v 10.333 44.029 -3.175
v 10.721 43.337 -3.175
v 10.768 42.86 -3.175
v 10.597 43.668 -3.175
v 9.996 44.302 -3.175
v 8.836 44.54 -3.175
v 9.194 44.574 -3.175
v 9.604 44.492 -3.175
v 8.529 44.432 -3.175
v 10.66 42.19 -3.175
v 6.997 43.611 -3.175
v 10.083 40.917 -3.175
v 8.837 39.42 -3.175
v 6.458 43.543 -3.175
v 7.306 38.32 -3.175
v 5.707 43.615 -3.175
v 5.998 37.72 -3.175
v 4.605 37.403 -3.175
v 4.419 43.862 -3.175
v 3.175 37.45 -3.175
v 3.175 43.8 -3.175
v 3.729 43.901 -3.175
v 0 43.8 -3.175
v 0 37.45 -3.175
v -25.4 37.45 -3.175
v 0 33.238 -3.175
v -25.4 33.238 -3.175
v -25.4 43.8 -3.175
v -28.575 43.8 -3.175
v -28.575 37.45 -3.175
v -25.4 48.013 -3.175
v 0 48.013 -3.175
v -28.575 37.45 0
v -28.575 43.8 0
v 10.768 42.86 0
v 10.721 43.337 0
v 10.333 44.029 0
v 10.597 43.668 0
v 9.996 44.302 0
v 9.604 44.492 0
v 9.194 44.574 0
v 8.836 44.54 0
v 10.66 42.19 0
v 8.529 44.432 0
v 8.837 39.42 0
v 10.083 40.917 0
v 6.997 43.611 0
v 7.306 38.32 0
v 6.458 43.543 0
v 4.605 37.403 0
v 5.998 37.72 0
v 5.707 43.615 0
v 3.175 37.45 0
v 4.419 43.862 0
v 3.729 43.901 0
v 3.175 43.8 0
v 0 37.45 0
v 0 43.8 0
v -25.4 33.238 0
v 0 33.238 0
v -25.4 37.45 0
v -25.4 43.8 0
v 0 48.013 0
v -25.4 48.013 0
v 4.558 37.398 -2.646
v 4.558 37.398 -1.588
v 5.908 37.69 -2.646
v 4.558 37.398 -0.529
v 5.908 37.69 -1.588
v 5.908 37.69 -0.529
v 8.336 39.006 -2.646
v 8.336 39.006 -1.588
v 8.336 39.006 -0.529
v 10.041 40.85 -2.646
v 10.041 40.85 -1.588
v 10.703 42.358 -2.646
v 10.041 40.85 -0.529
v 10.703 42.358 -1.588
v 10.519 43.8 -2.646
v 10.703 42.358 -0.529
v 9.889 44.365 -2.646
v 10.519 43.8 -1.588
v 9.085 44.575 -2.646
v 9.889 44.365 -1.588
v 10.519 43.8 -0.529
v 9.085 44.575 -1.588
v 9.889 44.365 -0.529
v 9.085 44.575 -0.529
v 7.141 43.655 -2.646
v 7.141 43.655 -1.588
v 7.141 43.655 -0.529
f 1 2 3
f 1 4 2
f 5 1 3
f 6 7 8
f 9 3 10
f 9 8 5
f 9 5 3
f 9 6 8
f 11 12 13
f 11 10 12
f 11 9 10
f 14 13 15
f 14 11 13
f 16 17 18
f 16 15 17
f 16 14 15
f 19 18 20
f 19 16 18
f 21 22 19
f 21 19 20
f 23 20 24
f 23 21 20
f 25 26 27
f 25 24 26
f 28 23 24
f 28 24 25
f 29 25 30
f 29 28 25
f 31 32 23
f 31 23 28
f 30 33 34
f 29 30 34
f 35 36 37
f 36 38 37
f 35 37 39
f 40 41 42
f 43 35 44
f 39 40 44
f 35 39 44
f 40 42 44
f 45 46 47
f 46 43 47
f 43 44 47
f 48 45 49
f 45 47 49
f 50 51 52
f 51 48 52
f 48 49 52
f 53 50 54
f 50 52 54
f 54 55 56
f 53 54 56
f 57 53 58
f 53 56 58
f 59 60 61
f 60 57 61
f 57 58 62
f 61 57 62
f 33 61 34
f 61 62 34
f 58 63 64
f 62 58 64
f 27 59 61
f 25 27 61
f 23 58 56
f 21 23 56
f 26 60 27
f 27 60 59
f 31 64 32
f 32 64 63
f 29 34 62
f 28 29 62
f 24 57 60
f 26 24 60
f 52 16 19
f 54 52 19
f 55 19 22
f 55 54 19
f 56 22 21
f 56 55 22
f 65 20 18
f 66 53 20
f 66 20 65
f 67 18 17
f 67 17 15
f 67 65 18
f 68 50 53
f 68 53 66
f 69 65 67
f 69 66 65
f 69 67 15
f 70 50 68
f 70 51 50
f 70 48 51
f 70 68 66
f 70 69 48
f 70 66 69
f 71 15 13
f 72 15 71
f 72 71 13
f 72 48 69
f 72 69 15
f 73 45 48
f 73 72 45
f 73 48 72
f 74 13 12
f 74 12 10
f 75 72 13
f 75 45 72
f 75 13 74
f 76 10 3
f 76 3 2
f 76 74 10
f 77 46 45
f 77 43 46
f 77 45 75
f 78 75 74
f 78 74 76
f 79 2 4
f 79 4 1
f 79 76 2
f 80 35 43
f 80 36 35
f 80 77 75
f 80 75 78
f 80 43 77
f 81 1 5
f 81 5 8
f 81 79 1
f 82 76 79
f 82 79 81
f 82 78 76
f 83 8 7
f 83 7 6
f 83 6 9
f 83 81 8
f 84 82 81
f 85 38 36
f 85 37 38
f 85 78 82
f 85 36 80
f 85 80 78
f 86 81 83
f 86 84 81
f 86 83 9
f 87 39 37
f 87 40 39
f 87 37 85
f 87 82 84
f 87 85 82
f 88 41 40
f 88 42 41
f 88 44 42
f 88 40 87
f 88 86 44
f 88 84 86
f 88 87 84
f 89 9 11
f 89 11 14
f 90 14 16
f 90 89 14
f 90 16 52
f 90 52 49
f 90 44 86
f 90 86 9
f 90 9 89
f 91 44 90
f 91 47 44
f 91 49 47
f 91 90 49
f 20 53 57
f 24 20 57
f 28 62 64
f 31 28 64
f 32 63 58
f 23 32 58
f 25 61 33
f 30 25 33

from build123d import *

# Parameters (mm, degrees)
BOSS_EXTRUDE1_DEPTH = 3.175


with BuildPart() as part:
    # Sketch1 → Boss-Extrude1 (new body)
    with BuildSketch(Plane.XY):
        with BuildLine():
            Line((0, 33.23762074), (-25.4, 33.23762074))
            Line((-25.4, 33.23762074), (-25.4, 37.450381497))
            Line((-25.4, 37.450381497), (-28.575, 37.450381497))
            Line((-28.575, 37.450381497), (-28.575, 43.800381497))
            Line((-28.575, 43.800381497), (-25.4, 43.800381497))
            Line((-25.4, 43.800381497), (-25.4, 48.013142253))
            Line((-25.4, 48.013142253), (0, 48.013142253))
            Line((0, 48.013142253), (0, 43.800381497))
            Line((0, 43.800381497), (3.175, 43.800381497))
            add(Edge.make_bspline(
                [(3.175, 37.450381497), (5.022063889, 37.118455803), (7.751511416, 38.26025543), (10.232762973, 40.756833062), (11.320046176, 43.626059772), (8.823727593, 45.046390193), (6.727894231, 42.678395659), (4.43155314, 44.217938487), (3.175, 43.800381497)],
                knots=[0, 0, 0, 0, 0.293580814, 0.427451978, 0.586796469, 0.673694467, 0.788354379, 1, 1, 1, 1], degree=3))
            Line((3.175, 37.450381497), (0, 37.450381497))
            Line((0, 37.450381497), (0, 33.23762074))
        make_face()
    extrude(amount=-BOSS_EXTRUDE1_DEPTH)


solid = part.part
